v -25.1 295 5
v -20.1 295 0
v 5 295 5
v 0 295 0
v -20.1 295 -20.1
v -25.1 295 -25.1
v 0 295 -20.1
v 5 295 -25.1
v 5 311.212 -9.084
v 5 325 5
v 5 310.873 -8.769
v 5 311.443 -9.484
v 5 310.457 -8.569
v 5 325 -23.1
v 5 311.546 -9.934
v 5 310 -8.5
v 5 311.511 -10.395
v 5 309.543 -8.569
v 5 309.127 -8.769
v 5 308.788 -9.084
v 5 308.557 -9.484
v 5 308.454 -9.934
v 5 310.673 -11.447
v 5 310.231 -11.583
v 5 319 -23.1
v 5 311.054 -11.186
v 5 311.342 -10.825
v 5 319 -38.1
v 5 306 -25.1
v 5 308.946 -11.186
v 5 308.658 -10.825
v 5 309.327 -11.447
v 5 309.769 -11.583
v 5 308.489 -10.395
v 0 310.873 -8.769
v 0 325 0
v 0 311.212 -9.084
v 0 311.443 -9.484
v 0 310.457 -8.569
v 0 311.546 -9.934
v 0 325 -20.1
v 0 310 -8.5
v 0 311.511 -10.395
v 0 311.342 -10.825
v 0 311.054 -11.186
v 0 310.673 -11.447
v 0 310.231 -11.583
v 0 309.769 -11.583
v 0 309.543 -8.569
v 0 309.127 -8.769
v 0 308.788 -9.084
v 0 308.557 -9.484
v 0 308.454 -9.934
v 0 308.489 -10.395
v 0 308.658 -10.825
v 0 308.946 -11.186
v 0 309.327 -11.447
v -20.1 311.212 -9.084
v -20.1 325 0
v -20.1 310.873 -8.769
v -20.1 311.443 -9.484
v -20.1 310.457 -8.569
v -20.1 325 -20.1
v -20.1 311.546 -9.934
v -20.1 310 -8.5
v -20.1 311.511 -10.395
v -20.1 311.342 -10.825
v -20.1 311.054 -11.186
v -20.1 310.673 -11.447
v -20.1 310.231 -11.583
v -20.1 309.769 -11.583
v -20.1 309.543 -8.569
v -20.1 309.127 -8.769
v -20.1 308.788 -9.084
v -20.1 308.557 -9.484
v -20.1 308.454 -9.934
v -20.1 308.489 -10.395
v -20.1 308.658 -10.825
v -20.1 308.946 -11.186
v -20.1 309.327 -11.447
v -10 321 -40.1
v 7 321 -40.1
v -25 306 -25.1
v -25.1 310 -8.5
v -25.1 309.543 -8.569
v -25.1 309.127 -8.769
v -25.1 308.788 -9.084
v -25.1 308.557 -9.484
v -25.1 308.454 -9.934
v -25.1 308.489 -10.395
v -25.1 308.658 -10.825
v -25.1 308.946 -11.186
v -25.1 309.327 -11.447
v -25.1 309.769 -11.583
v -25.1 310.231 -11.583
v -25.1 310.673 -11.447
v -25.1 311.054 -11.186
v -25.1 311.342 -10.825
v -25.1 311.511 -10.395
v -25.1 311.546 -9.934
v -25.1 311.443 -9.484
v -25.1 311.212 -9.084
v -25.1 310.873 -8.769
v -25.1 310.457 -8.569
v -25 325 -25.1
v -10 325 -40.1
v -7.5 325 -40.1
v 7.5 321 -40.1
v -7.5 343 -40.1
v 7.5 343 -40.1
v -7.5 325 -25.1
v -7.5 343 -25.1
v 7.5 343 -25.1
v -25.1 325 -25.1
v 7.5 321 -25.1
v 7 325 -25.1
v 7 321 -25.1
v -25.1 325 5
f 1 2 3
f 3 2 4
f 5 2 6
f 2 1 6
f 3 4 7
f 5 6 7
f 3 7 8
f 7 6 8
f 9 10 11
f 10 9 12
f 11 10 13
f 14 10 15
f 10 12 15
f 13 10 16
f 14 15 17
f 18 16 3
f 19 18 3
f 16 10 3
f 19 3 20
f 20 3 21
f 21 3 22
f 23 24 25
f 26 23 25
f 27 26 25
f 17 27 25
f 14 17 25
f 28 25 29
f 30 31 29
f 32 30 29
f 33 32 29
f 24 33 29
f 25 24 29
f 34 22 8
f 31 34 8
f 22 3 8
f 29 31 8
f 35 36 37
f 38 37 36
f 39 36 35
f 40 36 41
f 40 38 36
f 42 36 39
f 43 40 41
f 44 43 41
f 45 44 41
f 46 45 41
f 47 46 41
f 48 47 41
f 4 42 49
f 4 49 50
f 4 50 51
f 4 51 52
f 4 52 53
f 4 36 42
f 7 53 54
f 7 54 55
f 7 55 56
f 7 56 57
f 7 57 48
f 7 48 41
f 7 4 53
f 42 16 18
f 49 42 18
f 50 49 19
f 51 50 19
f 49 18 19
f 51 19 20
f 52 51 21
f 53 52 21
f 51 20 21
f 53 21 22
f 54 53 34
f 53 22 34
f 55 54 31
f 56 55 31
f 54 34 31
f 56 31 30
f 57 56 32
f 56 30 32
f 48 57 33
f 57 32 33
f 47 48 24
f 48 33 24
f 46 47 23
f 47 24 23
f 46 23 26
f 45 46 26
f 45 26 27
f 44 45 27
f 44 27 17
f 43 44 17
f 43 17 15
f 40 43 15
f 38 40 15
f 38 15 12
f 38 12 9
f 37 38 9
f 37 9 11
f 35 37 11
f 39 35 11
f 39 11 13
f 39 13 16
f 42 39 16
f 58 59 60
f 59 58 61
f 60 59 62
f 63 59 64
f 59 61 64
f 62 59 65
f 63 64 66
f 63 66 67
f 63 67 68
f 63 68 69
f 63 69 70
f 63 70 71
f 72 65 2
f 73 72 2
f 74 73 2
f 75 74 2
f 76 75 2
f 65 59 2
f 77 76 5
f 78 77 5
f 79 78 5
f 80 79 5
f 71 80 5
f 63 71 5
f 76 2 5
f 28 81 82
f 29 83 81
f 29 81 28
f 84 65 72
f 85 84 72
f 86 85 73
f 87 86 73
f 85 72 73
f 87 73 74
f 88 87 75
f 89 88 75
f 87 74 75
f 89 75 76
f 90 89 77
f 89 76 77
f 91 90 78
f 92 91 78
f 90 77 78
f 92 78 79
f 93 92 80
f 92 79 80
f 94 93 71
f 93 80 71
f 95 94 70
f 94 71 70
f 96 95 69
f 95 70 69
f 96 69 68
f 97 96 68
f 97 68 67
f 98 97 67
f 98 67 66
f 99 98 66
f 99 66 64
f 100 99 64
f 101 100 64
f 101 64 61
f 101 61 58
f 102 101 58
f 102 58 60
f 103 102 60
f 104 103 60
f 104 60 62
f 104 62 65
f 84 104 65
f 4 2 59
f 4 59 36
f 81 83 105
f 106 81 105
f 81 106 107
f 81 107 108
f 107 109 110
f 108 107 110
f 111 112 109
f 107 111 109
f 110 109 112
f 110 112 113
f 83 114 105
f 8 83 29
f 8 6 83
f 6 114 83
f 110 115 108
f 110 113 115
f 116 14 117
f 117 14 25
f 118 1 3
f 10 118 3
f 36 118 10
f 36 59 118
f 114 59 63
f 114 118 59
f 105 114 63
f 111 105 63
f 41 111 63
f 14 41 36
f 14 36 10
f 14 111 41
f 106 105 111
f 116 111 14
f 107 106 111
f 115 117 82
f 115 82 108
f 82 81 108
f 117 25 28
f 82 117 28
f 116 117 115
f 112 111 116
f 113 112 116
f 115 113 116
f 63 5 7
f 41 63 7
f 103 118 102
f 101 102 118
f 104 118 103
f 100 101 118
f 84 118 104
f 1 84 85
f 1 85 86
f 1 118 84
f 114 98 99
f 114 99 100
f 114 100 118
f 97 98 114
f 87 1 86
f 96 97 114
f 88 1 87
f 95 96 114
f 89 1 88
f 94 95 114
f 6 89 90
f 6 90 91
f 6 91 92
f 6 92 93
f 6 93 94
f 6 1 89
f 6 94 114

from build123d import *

# Parameters (mm, degrees)
SKETCH4_W                = 20.1
SKETCH4_H                = 20.1
BOSS_EXTRUDE6_DEPTH      = 5
BOSS_EXTRUDE7_DEPTH      = 15
BOSS_EXTRUDE7_DEPTH_BACK = 15
SKETCH4_4_W              = 30.1
SKETCH4_4_H              = 30.1
SKETCH4_4_W_2            = 20.1
SKETCH4_4_H_2            = 20.1
SKETCH5_R                = 1.55
CUT_EXTRUDE1_DEPTH       = 54
BOSS_EXTRUDE8_START      = 15
SKETCH4_5_W              = 15
SKETCH4_5_H              = 15
BOSS_EXTRUDE8_DEPTH      = 18
SKETCH6_W                = 17.5
SKETCH6_H                = 15
BOSS_EXTRUDE9_DEPTH      = 4
CHAMFER1_SIZE            = 15
CHAMFER2_SIZE            = 15
CHAMFER3_SIZE            = 2


with BuildPart() as part:
    # Sketch4 → Boss-Extrude6 (new body)
    with BuildSketch(Plane(origin=(0, 310, 0), x_dir=(1, 0, 0), z_dir=(0, 1, 0))):
        Polygon((5, 25.1), (-7.5, 25.1), (-25.1, 25.1), (-25.1, -5), (5, -5), align=None)
        with Locations((-10.05, 10.05)):
            Rectangle(SKETCH4_W, SKETCH4_H, mode=Mode.SUBTRACT)
    extrude(amount=-BOSS_EXTRUDE6_DEPTH)

    # Sketch4<4> → Boss-Extrude7 (add, two sides: drawn at the far end of the back side and taken through both)
    with BuildSketch(Plane(origin=(0, 310, 0), x_dir=(1, 0, 0), z_dir=(0, 1, 0)).offset(-BOSS_EXTRUDE7_DEPTH_BACK)):
        with Locations((-10.05, 10.05)):
            Rectangle(SKETCH4_4_W, SKETCH4_4_H)
        with Locations((-10.05, 10.05)):
            Rectangle(SKETCH4_4_W_2, SKETCH4_4_H_2, mode=Mode.SUBTRACT)
    extrude(amount=BOSS_EXTRUDE7_DEPTH + BOSS_EXTRUDE7_DEPTH_BACK)

    # Sketch5 → Cut-Extrude1 (cut)
    with BuildSketch(Plane(origin=(5, 0, 0), x_dir=(0, 0, -1), z_dir=(1, 0, 0))):
        with Locations(Location((10.05, 310, 0), (0, 0, 180))):
            Circle(SKETCH5_R)
    extrude(amount=-CUT_EXTRUDE1_DEPTH, mode=Mode.SUBTRACT)



with BuildPart() as body_2:
    # Sketch4<5> → Boss-Extrude8 (new body)
    with BuildSketch(Plane(origin=(0, 310, 0), x_dir=(1, 0, 0), z_dir=(0, 1, 0)).offset(BOSS_EXTRUDE8_START)):
        with Locations((0, 32.6)):
            Rectangle(SKETCH4_5_W, SKETCH4_5_H)
    extrude(amount=BOSS_EXTRUDE8_DEPTH)


with BuildPart() as part_1:
    add(part.part)

    add(body_2.part)  # Boss-Extrude9 merges body 2
    # Sketch6 → Boss-Extrude9 (add)
    with BuildSketch(Plane(origin=(0, 325, 0), x_dir=(1, 0, 0), z_dir=(0, 1, 0))):
        with Locations((-1.25, 32.6)):
            Rectangle(SKETCH6_W, SKETCH6_H)
    extrude(amount=-BOSS_EXTRUDE9_DEPTH)

    # Chamfer1
    chamfer1_edges = [part_1.edges().sort_by_distance(p)[0] for p in [
        (-2.5, 321, -25.1),
    ]]
    chamfer(chamfer1_edges, length=CHAMFER1_SIZE - 0.0001)  # a hair under: the kernel refuses the full size

    # Chamfer2
    chamfer2_edges = [part_1.edges().sort_by_distance(p)[0] for p in [
        (-10, 315.50005, -25.1),
    ]]
    chamfer(chamfer2_edges, length=CHAMFER2_SIZE - 0.0001)  # a hair under: the kernel refuses the full size

    # Chamfer3
    chamfer3_edges = [part_1.edges().sort_by_distance(p)[0] for p in [
        (5, 321, -32.59995),
        (5, 323, -25.1),
    ]]
    chamfer(chamfer3_edges, length=CHAMFER3_SIZE)


solid = part_1.part
